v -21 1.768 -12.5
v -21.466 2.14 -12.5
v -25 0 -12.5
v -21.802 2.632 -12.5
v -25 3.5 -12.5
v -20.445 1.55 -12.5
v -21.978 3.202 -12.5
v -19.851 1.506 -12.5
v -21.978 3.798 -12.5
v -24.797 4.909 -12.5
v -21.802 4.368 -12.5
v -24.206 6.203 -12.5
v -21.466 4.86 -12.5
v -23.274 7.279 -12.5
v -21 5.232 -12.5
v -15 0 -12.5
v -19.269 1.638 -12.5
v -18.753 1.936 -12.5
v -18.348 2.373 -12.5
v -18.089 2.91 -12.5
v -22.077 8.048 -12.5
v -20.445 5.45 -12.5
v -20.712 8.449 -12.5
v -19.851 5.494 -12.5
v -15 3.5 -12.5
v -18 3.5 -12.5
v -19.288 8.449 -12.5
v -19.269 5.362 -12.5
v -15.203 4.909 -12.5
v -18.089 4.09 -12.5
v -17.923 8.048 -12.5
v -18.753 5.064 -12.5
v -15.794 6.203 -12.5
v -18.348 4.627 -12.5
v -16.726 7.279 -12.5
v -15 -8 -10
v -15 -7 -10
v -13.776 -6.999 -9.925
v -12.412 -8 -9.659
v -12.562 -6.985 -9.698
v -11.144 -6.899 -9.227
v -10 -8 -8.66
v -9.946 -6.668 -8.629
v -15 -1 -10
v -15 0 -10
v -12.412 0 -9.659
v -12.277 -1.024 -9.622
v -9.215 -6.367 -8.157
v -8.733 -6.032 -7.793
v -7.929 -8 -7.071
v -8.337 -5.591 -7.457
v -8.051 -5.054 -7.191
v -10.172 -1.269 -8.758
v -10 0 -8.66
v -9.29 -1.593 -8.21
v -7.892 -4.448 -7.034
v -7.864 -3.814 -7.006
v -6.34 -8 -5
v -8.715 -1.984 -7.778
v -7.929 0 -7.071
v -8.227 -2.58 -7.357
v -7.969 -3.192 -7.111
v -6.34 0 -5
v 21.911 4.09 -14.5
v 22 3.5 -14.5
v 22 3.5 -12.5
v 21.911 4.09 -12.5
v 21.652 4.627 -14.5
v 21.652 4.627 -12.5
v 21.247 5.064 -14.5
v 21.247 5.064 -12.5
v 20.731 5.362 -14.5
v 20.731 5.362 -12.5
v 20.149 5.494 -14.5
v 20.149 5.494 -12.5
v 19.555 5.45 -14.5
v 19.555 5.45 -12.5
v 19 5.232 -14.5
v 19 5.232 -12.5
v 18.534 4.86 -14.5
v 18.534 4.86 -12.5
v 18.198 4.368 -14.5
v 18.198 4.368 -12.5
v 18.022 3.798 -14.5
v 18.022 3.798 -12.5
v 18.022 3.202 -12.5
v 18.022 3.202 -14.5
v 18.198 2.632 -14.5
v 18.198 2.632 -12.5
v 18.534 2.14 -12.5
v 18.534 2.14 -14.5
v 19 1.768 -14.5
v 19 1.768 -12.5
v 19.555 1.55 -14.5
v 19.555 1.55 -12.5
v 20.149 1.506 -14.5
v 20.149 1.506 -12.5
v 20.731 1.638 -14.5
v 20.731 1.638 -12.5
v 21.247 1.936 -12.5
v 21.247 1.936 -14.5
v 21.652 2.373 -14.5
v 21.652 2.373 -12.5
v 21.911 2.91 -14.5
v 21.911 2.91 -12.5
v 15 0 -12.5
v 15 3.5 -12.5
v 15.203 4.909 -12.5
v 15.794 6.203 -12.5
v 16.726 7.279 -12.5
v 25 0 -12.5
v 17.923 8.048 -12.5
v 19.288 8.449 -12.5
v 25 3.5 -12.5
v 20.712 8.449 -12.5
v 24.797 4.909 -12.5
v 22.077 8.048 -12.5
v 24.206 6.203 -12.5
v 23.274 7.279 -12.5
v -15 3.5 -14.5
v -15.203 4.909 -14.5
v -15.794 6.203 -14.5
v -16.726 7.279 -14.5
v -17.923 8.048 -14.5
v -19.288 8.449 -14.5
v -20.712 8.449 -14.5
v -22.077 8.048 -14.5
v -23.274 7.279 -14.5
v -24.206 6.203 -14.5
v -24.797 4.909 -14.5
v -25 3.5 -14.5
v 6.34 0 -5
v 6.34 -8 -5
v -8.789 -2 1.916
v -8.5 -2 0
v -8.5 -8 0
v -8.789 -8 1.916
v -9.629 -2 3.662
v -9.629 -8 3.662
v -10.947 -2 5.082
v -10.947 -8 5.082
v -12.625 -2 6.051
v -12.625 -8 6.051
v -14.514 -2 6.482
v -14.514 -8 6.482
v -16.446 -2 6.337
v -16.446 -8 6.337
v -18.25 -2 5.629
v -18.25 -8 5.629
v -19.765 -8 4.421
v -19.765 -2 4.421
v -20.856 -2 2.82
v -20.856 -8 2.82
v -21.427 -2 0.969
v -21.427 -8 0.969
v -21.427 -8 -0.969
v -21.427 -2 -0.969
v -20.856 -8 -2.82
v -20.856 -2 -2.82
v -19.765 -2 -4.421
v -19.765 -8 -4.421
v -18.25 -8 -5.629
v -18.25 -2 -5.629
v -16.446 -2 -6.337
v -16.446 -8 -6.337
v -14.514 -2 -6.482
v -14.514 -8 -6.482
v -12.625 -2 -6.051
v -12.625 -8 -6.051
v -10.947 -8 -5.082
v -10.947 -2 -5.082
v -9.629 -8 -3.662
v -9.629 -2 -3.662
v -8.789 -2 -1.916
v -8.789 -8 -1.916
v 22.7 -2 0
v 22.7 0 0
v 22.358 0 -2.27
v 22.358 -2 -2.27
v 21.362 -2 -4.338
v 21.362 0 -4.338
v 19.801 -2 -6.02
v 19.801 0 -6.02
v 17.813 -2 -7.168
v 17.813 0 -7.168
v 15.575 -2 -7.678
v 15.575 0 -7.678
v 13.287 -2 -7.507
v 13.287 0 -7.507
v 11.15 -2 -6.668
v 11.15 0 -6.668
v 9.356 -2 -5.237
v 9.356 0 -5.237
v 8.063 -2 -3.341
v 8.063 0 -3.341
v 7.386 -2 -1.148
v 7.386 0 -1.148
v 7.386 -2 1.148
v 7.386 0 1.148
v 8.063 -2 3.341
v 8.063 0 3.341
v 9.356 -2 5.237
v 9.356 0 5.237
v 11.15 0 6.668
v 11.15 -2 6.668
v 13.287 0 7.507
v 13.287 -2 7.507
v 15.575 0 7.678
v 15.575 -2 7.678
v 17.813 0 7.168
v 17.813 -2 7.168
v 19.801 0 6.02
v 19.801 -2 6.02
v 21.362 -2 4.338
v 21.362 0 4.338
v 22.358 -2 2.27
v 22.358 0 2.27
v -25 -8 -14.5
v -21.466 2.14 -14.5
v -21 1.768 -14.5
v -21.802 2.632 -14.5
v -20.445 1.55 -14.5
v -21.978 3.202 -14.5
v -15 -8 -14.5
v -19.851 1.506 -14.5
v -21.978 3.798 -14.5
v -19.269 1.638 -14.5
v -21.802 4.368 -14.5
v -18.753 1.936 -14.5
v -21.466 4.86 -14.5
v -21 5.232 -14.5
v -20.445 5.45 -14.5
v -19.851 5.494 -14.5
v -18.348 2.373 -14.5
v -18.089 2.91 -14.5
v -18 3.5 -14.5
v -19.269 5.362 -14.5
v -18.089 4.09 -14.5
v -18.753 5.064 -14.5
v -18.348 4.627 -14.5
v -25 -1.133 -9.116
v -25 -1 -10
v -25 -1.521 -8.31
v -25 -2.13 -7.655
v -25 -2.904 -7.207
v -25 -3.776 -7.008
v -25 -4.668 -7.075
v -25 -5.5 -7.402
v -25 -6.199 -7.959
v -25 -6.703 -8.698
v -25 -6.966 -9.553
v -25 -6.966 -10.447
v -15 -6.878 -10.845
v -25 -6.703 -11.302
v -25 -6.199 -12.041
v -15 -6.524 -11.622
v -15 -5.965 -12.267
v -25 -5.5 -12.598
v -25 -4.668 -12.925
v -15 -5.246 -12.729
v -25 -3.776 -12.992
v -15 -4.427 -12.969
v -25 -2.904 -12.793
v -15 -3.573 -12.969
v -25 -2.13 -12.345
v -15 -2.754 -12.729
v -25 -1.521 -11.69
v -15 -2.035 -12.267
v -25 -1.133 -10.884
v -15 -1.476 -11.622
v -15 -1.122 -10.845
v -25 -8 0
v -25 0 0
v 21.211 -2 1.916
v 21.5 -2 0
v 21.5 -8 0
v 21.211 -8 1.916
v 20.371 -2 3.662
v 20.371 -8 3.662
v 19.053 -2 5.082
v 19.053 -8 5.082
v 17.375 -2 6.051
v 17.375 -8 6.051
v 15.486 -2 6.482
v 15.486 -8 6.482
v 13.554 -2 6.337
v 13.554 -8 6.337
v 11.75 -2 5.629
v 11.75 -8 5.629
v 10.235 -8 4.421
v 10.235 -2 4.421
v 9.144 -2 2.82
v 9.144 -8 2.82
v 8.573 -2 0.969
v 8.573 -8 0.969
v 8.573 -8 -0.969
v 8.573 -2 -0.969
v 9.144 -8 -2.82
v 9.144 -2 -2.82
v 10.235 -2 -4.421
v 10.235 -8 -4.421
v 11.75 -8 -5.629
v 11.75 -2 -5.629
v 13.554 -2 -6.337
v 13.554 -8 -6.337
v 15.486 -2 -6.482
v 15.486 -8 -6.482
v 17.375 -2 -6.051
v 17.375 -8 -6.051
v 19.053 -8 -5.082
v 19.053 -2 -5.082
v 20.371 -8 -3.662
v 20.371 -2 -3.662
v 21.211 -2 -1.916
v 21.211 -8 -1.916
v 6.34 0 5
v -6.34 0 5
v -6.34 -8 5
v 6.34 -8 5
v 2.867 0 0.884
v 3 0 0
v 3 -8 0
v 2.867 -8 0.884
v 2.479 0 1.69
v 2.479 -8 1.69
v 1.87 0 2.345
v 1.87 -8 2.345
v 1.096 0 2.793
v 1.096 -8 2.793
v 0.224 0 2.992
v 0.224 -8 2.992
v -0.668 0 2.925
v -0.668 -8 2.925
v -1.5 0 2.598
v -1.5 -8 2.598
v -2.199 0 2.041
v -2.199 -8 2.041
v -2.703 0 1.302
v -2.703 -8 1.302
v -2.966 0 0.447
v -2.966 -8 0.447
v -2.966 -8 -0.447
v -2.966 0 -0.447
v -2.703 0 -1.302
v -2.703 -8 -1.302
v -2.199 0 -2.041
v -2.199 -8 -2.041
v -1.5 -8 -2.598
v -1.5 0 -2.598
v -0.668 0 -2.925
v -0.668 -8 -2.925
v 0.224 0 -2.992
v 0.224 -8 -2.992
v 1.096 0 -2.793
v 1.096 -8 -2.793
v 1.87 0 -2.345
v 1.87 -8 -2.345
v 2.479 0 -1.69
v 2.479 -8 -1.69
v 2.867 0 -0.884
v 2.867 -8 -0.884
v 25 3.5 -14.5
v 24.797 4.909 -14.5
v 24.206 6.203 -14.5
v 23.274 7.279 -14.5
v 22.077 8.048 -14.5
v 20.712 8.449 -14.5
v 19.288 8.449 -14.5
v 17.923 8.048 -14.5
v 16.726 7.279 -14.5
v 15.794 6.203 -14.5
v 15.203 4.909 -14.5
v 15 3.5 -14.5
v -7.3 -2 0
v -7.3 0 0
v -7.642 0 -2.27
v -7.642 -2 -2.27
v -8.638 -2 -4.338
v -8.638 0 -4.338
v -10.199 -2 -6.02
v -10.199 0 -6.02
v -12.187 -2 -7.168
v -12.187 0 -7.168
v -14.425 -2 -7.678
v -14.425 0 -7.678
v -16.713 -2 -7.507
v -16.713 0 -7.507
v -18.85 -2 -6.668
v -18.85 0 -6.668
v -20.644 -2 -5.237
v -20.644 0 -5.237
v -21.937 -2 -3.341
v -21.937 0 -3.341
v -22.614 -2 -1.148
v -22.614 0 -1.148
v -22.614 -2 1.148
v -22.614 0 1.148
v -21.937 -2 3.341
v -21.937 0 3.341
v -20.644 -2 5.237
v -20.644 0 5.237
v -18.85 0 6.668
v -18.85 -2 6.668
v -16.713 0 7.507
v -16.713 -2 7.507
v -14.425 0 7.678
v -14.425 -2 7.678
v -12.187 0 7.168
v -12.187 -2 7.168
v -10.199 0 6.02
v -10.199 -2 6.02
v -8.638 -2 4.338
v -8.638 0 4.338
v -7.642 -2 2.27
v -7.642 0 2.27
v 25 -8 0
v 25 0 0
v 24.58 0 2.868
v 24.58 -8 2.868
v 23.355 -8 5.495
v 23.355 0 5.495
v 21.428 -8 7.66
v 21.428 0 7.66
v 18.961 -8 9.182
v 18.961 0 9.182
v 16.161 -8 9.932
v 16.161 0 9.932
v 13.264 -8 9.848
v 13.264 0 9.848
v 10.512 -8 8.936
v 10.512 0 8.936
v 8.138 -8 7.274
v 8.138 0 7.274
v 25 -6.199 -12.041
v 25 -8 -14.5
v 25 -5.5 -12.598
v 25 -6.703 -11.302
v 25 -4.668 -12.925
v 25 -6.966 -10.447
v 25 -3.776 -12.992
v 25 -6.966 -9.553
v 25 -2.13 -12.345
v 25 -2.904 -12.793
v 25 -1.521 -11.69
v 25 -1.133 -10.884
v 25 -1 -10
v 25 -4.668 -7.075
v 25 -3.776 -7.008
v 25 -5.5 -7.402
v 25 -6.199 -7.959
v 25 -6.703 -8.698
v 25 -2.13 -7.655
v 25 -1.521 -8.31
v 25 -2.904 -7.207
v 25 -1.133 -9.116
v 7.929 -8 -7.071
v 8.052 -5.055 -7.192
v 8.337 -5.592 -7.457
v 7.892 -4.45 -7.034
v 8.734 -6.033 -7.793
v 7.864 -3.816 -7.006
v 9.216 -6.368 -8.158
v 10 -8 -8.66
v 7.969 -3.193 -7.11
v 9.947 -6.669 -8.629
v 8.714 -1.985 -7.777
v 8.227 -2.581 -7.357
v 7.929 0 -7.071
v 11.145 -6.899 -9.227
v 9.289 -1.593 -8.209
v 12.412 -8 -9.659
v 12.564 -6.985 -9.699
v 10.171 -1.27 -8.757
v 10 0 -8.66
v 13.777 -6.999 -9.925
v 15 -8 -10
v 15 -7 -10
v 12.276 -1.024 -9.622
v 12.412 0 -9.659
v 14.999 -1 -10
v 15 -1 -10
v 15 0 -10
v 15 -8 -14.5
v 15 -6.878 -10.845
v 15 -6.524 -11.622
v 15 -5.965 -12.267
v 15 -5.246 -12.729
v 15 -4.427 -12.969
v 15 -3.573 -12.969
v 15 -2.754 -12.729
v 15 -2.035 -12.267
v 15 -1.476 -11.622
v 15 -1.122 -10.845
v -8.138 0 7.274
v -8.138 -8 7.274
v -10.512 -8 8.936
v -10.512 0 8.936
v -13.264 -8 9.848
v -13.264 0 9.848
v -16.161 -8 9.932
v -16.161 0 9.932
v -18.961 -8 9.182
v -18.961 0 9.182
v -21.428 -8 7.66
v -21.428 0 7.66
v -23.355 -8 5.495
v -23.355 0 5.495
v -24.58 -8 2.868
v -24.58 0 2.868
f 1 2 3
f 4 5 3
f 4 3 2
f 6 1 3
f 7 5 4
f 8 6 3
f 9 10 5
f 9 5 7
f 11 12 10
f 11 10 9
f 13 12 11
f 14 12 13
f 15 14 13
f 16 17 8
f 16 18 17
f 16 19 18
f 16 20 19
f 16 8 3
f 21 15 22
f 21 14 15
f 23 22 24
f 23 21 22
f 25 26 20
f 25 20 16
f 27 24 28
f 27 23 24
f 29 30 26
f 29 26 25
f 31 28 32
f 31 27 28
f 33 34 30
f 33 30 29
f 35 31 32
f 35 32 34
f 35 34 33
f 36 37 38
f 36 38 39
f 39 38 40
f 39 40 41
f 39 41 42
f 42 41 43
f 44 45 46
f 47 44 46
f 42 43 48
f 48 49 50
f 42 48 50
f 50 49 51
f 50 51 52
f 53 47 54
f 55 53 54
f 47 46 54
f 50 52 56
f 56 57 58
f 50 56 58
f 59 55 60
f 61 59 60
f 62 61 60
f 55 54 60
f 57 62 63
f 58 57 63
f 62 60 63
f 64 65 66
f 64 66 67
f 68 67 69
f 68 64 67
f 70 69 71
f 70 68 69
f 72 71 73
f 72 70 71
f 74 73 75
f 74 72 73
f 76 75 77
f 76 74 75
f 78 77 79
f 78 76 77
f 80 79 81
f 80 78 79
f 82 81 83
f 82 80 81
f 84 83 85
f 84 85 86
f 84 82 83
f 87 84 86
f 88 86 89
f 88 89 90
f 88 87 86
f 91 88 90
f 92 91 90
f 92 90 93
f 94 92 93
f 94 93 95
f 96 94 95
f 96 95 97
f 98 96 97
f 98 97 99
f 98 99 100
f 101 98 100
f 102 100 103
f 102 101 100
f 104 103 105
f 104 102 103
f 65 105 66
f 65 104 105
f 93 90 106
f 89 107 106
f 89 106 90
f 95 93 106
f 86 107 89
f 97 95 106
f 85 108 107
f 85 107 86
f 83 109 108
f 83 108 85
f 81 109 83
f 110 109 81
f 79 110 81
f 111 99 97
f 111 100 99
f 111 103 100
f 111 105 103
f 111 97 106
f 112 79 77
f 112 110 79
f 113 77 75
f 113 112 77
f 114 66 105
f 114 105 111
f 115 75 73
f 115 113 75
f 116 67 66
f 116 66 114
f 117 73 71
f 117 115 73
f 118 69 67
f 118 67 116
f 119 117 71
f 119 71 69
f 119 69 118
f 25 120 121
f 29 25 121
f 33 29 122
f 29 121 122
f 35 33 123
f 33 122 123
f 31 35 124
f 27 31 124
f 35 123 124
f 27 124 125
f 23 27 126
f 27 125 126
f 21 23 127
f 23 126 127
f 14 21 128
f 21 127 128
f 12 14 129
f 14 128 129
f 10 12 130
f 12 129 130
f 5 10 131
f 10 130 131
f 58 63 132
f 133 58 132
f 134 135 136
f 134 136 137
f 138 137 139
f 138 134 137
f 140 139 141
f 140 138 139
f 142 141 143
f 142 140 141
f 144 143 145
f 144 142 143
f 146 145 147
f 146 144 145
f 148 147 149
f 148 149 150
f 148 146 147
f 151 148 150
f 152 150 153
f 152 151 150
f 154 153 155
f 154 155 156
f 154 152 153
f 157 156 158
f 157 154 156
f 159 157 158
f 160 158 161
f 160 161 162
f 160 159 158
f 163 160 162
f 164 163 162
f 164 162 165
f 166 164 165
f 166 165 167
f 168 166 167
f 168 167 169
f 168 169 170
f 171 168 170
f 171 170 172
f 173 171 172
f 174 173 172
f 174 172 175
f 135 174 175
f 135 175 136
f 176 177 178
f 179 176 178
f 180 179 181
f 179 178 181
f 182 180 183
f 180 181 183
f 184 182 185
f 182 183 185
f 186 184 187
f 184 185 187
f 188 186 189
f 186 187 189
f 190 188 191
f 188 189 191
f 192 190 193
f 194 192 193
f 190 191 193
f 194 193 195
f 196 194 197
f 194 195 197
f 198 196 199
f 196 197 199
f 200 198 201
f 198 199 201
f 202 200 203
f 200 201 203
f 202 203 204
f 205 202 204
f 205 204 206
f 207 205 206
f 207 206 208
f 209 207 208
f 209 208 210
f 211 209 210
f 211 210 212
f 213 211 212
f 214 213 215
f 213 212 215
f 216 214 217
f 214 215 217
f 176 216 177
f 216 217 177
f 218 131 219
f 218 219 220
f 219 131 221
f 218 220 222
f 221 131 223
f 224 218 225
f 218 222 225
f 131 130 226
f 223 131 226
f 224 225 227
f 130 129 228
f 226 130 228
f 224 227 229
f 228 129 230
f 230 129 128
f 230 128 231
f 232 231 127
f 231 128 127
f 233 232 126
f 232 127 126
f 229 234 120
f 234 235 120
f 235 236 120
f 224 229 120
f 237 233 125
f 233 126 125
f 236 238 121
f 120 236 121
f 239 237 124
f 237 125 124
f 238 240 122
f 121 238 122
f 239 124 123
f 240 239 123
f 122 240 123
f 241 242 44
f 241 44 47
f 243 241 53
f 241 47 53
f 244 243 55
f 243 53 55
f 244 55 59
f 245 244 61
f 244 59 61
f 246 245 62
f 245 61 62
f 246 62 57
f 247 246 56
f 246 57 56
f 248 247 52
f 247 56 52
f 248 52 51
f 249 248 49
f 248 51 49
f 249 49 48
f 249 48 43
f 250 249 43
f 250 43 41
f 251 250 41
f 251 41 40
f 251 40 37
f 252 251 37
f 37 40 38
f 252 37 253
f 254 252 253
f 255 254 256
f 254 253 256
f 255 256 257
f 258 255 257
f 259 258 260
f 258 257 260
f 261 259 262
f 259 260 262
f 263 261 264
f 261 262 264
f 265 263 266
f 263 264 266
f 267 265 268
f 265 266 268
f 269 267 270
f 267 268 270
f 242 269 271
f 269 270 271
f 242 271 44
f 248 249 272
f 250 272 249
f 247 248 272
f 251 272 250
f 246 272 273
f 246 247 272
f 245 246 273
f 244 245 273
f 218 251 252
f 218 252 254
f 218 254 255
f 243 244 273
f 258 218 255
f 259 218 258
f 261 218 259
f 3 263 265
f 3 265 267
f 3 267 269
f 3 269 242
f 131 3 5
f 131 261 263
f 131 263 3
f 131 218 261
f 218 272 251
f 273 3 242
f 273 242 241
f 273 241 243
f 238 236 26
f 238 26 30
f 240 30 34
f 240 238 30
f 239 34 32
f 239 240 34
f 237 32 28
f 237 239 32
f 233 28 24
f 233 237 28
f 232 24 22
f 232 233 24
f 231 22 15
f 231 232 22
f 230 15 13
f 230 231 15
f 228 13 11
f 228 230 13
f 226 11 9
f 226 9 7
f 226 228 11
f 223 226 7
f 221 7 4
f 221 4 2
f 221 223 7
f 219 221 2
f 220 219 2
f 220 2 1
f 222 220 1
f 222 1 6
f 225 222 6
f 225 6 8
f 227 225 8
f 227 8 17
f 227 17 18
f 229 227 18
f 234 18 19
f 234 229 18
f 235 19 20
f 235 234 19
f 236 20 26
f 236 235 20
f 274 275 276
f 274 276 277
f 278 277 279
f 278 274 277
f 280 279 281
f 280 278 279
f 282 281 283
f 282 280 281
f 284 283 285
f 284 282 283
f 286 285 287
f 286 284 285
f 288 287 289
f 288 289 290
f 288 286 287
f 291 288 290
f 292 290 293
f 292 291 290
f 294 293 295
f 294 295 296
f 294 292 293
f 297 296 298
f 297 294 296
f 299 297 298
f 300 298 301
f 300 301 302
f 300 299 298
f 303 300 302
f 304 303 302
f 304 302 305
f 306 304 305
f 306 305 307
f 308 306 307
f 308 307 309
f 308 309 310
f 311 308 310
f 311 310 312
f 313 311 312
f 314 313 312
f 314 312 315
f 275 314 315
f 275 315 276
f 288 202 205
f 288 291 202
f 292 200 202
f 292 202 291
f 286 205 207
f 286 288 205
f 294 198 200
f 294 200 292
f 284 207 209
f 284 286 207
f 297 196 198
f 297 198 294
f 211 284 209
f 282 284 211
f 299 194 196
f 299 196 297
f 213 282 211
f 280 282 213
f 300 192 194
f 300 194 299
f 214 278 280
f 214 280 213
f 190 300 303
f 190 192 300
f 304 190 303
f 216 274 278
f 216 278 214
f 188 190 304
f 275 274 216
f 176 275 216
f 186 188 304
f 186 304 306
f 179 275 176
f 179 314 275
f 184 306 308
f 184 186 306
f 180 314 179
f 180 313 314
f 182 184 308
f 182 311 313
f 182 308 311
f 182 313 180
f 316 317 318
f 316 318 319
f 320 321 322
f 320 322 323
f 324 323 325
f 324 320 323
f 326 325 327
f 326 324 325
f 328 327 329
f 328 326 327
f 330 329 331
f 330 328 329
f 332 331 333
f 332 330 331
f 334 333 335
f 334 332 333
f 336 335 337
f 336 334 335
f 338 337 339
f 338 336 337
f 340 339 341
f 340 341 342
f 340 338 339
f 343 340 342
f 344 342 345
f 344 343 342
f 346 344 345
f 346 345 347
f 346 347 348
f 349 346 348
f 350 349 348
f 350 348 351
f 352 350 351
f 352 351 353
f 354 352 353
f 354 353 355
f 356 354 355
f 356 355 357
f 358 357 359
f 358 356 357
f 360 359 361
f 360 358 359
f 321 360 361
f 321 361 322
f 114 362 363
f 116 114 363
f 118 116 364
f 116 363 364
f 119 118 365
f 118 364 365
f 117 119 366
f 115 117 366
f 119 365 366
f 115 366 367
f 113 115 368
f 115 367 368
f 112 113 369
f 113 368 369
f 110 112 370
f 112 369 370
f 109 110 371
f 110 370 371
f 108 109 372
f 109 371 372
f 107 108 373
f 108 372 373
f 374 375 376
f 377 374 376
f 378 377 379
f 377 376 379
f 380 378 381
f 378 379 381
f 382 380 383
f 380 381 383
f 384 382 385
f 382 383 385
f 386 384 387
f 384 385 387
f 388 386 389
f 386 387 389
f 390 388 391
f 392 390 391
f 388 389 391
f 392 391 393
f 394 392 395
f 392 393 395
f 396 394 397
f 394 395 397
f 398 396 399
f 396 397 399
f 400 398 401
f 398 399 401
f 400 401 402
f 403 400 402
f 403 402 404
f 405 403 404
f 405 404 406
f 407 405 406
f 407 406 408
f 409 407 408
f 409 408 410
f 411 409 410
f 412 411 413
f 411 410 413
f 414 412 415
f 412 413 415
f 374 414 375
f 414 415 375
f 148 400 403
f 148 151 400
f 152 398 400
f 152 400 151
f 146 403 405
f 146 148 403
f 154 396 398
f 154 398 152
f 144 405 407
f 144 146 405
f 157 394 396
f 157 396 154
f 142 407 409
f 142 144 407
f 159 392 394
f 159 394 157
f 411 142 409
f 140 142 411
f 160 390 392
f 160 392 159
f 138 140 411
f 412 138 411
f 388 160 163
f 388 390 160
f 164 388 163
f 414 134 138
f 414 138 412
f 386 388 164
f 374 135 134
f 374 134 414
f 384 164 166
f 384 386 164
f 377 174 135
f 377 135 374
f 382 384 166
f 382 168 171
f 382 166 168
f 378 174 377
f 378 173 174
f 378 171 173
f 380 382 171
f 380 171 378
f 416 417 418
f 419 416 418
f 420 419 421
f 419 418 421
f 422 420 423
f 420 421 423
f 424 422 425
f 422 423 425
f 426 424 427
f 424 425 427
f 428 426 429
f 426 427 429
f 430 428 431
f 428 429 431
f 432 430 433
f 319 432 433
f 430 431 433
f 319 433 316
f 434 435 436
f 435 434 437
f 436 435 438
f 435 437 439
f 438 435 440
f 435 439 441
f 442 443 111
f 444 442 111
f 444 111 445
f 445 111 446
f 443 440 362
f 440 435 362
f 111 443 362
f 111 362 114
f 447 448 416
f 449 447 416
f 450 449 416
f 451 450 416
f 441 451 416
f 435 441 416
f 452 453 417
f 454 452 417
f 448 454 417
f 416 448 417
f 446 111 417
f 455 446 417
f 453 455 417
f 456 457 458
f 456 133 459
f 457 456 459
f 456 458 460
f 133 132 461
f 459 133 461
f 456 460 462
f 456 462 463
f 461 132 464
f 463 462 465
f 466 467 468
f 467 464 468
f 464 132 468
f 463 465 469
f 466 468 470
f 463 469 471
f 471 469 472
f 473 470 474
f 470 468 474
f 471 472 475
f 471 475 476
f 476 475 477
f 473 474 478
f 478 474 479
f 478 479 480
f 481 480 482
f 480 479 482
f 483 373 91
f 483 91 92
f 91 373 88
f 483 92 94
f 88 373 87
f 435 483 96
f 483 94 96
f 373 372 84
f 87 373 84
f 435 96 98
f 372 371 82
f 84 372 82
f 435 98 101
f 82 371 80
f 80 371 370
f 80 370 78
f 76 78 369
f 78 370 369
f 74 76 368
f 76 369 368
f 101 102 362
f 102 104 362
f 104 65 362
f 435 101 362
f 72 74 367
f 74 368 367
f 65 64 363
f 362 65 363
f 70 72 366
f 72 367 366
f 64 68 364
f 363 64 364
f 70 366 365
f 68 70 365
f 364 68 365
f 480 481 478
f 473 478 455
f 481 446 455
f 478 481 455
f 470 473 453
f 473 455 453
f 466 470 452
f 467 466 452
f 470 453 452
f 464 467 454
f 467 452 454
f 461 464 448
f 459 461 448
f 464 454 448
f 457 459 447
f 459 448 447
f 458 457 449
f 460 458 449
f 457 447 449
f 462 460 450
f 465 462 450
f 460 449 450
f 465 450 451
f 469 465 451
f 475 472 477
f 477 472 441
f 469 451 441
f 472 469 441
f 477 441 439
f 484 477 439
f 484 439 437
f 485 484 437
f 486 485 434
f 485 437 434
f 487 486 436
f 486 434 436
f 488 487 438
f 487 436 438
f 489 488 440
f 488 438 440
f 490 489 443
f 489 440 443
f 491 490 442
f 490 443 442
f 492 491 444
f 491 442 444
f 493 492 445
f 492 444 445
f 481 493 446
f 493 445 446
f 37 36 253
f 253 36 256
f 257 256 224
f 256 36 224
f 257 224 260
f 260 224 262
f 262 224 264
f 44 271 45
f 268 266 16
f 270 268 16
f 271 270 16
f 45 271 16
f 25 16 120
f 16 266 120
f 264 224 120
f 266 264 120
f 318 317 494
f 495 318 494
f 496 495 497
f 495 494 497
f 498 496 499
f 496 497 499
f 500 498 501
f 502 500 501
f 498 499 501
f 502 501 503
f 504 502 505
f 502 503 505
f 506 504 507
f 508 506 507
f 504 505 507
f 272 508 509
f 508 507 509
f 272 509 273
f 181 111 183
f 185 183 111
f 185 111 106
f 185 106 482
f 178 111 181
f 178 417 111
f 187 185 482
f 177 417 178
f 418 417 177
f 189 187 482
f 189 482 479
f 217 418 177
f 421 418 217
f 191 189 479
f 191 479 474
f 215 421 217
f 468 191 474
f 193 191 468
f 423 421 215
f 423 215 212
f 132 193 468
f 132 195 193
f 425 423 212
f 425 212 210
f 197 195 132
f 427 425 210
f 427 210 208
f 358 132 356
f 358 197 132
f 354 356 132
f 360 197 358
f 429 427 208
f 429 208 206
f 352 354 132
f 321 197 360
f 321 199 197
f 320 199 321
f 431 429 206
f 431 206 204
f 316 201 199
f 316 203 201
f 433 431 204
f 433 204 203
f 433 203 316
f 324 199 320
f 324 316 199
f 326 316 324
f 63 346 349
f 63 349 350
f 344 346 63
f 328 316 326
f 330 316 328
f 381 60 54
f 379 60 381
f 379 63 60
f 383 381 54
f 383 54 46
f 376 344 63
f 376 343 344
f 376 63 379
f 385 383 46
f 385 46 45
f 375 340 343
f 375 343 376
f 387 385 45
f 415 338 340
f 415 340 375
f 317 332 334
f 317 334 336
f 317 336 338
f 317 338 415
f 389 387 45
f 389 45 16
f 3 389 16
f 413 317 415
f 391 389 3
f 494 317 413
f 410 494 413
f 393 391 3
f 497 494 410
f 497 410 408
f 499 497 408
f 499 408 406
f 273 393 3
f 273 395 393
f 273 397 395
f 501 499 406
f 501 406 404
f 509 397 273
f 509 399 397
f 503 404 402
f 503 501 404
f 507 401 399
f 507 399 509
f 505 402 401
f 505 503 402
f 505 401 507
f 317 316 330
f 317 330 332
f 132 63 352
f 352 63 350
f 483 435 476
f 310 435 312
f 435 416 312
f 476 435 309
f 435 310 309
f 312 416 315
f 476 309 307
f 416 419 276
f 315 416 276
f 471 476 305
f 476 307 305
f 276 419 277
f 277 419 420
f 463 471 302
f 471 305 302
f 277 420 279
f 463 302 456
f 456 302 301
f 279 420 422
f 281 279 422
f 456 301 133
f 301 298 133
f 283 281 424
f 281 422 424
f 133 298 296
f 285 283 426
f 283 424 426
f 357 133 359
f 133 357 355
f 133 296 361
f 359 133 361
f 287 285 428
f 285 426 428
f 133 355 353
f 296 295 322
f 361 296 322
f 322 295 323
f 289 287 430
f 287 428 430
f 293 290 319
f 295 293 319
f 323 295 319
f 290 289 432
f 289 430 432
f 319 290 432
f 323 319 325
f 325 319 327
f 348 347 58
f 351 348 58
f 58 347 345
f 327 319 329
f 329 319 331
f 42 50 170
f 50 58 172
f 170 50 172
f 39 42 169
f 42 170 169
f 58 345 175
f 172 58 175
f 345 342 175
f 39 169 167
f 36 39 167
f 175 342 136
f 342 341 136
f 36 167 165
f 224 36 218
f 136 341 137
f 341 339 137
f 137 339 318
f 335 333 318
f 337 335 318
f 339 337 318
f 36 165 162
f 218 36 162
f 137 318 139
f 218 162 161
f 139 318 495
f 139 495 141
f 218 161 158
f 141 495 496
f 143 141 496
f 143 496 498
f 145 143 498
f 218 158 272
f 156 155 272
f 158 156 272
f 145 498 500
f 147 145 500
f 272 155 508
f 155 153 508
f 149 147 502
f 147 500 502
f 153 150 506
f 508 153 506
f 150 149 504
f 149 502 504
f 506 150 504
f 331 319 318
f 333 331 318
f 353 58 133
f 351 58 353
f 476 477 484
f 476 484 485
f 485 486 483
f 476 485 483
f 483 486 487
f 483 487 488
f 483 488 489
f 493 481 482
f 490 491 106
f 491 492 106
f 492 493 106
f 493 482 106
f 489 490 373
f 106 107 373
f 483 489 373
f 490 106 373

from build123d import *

# Parameters (mm, degrees)
SKETCH002_R     = 6.5
SKETCH002_R_2   = 3
PAD_DEPTH       = 8
SKETCH003_R     = 7.7
POCKET_DEPTH    = 2
SKETCH004_R     = 3
POCKET001_DEPTH = 31
SKETCH005_R     = 2
PAD001_DEPTH    = 2


with BuildPart() as part:
    # Sketch002 → Pad (new body)
    with BuildSketch(Plane.XZ):
        with BuildLine():
            Line((-6.339746, 5), (6.339746, 5))
            ThreePointArc((25, 0), (17.58819, 9.659258), (6.339746, 5))
            Line((25, -14.5), (25, 0))
            Line((15, -14.5), (25, -14.5))
            Line((15, -10), (15, -14.5))
            ThreePointArc((6.339746, -5), (10, -8.660254), (15, -10))
            Line((-6.339746, -5), (6.339746, -5))
            ThreePointArc((-15, -10), (-10, -8.660254), (-6.339746, -5))
            Line((-15, -10), (-15, -14.5))
            Line((-25, -14.5), (-15, -14.5))
            Line((-25, 0), (-25, -14.5))
            ThreePointArc((-6.339746, 5), (-17.58819, 9.659258), (-25, 0))
        make_face()
        with Locations((-15, 0)):
            Circle(SKETCH002_R, mode=Mode.SUBTRACT)
        with Locations((15, 0)):
            Circle(SKETCH002_R, mode=Mode.SUBTRACT)
        Circle(SKETCH002_R_2, mode=Mode.SUBTRACT)
    extrude(amount=PAD_DEPTH)

    # Sketch003 (on Face16 of Pad) → Pocket (cut)
    with BuildSketch(Plane(origin=(0, 0, 0), x_dir=(1, 0, 0), z_dir=(0, 1, 0))):
        with Locations((-15, 0)):
            Circle(SKETCH003_R)
        with Locations((15, 0)):
            Circle(SKETCH003_R)
    extrude(amount=-POCKET_DEPTH, mode=Mode.SUBTRACT)

    # Sketch004 → Pocket001 (cut, symmetric)
    with BuildSketch(Plane.YZ):
        with Locations((-4, -10)):
            Circle(SKETCH004_R)
    extrude(amount=POCKET001_DEPTH, both=True, mode=Mode.SUBTRACT)

    # Sketch005 → Pad001 (join)
    with BuildSketch(Plane.XY.offset(-14.5)):
        with BuildLine():
            Line((-25, 0), (-15, 0))
            Line((-15, 0), (-15, 3.5))
            ThreePointArc((-15, 3.5), (-20, 8.5), (-25, 3.5))
            Line((-25, 0), (-25, 3.5))
        make_face()
        with Locations((-20, 3.5)):
            Circle(SKETCH005_R, mode=Mode.SUBTRACT)
        with BuildLine():
            Line((15, 0), (25, 0))
            Line((25, 0), (25, 3.5))
            ThreePointArc((25, 3.5), (20, 8.5), (15, 3.5))
            Line((15, 0), (15, 3.5))
        make_face()
        with Locations((20, 3.5)):
            Circle(SKETCH005_R, mode=Mode.SUBTRACT)
    extrude(amount=PAD001_DEPTH)


solid = part.part
